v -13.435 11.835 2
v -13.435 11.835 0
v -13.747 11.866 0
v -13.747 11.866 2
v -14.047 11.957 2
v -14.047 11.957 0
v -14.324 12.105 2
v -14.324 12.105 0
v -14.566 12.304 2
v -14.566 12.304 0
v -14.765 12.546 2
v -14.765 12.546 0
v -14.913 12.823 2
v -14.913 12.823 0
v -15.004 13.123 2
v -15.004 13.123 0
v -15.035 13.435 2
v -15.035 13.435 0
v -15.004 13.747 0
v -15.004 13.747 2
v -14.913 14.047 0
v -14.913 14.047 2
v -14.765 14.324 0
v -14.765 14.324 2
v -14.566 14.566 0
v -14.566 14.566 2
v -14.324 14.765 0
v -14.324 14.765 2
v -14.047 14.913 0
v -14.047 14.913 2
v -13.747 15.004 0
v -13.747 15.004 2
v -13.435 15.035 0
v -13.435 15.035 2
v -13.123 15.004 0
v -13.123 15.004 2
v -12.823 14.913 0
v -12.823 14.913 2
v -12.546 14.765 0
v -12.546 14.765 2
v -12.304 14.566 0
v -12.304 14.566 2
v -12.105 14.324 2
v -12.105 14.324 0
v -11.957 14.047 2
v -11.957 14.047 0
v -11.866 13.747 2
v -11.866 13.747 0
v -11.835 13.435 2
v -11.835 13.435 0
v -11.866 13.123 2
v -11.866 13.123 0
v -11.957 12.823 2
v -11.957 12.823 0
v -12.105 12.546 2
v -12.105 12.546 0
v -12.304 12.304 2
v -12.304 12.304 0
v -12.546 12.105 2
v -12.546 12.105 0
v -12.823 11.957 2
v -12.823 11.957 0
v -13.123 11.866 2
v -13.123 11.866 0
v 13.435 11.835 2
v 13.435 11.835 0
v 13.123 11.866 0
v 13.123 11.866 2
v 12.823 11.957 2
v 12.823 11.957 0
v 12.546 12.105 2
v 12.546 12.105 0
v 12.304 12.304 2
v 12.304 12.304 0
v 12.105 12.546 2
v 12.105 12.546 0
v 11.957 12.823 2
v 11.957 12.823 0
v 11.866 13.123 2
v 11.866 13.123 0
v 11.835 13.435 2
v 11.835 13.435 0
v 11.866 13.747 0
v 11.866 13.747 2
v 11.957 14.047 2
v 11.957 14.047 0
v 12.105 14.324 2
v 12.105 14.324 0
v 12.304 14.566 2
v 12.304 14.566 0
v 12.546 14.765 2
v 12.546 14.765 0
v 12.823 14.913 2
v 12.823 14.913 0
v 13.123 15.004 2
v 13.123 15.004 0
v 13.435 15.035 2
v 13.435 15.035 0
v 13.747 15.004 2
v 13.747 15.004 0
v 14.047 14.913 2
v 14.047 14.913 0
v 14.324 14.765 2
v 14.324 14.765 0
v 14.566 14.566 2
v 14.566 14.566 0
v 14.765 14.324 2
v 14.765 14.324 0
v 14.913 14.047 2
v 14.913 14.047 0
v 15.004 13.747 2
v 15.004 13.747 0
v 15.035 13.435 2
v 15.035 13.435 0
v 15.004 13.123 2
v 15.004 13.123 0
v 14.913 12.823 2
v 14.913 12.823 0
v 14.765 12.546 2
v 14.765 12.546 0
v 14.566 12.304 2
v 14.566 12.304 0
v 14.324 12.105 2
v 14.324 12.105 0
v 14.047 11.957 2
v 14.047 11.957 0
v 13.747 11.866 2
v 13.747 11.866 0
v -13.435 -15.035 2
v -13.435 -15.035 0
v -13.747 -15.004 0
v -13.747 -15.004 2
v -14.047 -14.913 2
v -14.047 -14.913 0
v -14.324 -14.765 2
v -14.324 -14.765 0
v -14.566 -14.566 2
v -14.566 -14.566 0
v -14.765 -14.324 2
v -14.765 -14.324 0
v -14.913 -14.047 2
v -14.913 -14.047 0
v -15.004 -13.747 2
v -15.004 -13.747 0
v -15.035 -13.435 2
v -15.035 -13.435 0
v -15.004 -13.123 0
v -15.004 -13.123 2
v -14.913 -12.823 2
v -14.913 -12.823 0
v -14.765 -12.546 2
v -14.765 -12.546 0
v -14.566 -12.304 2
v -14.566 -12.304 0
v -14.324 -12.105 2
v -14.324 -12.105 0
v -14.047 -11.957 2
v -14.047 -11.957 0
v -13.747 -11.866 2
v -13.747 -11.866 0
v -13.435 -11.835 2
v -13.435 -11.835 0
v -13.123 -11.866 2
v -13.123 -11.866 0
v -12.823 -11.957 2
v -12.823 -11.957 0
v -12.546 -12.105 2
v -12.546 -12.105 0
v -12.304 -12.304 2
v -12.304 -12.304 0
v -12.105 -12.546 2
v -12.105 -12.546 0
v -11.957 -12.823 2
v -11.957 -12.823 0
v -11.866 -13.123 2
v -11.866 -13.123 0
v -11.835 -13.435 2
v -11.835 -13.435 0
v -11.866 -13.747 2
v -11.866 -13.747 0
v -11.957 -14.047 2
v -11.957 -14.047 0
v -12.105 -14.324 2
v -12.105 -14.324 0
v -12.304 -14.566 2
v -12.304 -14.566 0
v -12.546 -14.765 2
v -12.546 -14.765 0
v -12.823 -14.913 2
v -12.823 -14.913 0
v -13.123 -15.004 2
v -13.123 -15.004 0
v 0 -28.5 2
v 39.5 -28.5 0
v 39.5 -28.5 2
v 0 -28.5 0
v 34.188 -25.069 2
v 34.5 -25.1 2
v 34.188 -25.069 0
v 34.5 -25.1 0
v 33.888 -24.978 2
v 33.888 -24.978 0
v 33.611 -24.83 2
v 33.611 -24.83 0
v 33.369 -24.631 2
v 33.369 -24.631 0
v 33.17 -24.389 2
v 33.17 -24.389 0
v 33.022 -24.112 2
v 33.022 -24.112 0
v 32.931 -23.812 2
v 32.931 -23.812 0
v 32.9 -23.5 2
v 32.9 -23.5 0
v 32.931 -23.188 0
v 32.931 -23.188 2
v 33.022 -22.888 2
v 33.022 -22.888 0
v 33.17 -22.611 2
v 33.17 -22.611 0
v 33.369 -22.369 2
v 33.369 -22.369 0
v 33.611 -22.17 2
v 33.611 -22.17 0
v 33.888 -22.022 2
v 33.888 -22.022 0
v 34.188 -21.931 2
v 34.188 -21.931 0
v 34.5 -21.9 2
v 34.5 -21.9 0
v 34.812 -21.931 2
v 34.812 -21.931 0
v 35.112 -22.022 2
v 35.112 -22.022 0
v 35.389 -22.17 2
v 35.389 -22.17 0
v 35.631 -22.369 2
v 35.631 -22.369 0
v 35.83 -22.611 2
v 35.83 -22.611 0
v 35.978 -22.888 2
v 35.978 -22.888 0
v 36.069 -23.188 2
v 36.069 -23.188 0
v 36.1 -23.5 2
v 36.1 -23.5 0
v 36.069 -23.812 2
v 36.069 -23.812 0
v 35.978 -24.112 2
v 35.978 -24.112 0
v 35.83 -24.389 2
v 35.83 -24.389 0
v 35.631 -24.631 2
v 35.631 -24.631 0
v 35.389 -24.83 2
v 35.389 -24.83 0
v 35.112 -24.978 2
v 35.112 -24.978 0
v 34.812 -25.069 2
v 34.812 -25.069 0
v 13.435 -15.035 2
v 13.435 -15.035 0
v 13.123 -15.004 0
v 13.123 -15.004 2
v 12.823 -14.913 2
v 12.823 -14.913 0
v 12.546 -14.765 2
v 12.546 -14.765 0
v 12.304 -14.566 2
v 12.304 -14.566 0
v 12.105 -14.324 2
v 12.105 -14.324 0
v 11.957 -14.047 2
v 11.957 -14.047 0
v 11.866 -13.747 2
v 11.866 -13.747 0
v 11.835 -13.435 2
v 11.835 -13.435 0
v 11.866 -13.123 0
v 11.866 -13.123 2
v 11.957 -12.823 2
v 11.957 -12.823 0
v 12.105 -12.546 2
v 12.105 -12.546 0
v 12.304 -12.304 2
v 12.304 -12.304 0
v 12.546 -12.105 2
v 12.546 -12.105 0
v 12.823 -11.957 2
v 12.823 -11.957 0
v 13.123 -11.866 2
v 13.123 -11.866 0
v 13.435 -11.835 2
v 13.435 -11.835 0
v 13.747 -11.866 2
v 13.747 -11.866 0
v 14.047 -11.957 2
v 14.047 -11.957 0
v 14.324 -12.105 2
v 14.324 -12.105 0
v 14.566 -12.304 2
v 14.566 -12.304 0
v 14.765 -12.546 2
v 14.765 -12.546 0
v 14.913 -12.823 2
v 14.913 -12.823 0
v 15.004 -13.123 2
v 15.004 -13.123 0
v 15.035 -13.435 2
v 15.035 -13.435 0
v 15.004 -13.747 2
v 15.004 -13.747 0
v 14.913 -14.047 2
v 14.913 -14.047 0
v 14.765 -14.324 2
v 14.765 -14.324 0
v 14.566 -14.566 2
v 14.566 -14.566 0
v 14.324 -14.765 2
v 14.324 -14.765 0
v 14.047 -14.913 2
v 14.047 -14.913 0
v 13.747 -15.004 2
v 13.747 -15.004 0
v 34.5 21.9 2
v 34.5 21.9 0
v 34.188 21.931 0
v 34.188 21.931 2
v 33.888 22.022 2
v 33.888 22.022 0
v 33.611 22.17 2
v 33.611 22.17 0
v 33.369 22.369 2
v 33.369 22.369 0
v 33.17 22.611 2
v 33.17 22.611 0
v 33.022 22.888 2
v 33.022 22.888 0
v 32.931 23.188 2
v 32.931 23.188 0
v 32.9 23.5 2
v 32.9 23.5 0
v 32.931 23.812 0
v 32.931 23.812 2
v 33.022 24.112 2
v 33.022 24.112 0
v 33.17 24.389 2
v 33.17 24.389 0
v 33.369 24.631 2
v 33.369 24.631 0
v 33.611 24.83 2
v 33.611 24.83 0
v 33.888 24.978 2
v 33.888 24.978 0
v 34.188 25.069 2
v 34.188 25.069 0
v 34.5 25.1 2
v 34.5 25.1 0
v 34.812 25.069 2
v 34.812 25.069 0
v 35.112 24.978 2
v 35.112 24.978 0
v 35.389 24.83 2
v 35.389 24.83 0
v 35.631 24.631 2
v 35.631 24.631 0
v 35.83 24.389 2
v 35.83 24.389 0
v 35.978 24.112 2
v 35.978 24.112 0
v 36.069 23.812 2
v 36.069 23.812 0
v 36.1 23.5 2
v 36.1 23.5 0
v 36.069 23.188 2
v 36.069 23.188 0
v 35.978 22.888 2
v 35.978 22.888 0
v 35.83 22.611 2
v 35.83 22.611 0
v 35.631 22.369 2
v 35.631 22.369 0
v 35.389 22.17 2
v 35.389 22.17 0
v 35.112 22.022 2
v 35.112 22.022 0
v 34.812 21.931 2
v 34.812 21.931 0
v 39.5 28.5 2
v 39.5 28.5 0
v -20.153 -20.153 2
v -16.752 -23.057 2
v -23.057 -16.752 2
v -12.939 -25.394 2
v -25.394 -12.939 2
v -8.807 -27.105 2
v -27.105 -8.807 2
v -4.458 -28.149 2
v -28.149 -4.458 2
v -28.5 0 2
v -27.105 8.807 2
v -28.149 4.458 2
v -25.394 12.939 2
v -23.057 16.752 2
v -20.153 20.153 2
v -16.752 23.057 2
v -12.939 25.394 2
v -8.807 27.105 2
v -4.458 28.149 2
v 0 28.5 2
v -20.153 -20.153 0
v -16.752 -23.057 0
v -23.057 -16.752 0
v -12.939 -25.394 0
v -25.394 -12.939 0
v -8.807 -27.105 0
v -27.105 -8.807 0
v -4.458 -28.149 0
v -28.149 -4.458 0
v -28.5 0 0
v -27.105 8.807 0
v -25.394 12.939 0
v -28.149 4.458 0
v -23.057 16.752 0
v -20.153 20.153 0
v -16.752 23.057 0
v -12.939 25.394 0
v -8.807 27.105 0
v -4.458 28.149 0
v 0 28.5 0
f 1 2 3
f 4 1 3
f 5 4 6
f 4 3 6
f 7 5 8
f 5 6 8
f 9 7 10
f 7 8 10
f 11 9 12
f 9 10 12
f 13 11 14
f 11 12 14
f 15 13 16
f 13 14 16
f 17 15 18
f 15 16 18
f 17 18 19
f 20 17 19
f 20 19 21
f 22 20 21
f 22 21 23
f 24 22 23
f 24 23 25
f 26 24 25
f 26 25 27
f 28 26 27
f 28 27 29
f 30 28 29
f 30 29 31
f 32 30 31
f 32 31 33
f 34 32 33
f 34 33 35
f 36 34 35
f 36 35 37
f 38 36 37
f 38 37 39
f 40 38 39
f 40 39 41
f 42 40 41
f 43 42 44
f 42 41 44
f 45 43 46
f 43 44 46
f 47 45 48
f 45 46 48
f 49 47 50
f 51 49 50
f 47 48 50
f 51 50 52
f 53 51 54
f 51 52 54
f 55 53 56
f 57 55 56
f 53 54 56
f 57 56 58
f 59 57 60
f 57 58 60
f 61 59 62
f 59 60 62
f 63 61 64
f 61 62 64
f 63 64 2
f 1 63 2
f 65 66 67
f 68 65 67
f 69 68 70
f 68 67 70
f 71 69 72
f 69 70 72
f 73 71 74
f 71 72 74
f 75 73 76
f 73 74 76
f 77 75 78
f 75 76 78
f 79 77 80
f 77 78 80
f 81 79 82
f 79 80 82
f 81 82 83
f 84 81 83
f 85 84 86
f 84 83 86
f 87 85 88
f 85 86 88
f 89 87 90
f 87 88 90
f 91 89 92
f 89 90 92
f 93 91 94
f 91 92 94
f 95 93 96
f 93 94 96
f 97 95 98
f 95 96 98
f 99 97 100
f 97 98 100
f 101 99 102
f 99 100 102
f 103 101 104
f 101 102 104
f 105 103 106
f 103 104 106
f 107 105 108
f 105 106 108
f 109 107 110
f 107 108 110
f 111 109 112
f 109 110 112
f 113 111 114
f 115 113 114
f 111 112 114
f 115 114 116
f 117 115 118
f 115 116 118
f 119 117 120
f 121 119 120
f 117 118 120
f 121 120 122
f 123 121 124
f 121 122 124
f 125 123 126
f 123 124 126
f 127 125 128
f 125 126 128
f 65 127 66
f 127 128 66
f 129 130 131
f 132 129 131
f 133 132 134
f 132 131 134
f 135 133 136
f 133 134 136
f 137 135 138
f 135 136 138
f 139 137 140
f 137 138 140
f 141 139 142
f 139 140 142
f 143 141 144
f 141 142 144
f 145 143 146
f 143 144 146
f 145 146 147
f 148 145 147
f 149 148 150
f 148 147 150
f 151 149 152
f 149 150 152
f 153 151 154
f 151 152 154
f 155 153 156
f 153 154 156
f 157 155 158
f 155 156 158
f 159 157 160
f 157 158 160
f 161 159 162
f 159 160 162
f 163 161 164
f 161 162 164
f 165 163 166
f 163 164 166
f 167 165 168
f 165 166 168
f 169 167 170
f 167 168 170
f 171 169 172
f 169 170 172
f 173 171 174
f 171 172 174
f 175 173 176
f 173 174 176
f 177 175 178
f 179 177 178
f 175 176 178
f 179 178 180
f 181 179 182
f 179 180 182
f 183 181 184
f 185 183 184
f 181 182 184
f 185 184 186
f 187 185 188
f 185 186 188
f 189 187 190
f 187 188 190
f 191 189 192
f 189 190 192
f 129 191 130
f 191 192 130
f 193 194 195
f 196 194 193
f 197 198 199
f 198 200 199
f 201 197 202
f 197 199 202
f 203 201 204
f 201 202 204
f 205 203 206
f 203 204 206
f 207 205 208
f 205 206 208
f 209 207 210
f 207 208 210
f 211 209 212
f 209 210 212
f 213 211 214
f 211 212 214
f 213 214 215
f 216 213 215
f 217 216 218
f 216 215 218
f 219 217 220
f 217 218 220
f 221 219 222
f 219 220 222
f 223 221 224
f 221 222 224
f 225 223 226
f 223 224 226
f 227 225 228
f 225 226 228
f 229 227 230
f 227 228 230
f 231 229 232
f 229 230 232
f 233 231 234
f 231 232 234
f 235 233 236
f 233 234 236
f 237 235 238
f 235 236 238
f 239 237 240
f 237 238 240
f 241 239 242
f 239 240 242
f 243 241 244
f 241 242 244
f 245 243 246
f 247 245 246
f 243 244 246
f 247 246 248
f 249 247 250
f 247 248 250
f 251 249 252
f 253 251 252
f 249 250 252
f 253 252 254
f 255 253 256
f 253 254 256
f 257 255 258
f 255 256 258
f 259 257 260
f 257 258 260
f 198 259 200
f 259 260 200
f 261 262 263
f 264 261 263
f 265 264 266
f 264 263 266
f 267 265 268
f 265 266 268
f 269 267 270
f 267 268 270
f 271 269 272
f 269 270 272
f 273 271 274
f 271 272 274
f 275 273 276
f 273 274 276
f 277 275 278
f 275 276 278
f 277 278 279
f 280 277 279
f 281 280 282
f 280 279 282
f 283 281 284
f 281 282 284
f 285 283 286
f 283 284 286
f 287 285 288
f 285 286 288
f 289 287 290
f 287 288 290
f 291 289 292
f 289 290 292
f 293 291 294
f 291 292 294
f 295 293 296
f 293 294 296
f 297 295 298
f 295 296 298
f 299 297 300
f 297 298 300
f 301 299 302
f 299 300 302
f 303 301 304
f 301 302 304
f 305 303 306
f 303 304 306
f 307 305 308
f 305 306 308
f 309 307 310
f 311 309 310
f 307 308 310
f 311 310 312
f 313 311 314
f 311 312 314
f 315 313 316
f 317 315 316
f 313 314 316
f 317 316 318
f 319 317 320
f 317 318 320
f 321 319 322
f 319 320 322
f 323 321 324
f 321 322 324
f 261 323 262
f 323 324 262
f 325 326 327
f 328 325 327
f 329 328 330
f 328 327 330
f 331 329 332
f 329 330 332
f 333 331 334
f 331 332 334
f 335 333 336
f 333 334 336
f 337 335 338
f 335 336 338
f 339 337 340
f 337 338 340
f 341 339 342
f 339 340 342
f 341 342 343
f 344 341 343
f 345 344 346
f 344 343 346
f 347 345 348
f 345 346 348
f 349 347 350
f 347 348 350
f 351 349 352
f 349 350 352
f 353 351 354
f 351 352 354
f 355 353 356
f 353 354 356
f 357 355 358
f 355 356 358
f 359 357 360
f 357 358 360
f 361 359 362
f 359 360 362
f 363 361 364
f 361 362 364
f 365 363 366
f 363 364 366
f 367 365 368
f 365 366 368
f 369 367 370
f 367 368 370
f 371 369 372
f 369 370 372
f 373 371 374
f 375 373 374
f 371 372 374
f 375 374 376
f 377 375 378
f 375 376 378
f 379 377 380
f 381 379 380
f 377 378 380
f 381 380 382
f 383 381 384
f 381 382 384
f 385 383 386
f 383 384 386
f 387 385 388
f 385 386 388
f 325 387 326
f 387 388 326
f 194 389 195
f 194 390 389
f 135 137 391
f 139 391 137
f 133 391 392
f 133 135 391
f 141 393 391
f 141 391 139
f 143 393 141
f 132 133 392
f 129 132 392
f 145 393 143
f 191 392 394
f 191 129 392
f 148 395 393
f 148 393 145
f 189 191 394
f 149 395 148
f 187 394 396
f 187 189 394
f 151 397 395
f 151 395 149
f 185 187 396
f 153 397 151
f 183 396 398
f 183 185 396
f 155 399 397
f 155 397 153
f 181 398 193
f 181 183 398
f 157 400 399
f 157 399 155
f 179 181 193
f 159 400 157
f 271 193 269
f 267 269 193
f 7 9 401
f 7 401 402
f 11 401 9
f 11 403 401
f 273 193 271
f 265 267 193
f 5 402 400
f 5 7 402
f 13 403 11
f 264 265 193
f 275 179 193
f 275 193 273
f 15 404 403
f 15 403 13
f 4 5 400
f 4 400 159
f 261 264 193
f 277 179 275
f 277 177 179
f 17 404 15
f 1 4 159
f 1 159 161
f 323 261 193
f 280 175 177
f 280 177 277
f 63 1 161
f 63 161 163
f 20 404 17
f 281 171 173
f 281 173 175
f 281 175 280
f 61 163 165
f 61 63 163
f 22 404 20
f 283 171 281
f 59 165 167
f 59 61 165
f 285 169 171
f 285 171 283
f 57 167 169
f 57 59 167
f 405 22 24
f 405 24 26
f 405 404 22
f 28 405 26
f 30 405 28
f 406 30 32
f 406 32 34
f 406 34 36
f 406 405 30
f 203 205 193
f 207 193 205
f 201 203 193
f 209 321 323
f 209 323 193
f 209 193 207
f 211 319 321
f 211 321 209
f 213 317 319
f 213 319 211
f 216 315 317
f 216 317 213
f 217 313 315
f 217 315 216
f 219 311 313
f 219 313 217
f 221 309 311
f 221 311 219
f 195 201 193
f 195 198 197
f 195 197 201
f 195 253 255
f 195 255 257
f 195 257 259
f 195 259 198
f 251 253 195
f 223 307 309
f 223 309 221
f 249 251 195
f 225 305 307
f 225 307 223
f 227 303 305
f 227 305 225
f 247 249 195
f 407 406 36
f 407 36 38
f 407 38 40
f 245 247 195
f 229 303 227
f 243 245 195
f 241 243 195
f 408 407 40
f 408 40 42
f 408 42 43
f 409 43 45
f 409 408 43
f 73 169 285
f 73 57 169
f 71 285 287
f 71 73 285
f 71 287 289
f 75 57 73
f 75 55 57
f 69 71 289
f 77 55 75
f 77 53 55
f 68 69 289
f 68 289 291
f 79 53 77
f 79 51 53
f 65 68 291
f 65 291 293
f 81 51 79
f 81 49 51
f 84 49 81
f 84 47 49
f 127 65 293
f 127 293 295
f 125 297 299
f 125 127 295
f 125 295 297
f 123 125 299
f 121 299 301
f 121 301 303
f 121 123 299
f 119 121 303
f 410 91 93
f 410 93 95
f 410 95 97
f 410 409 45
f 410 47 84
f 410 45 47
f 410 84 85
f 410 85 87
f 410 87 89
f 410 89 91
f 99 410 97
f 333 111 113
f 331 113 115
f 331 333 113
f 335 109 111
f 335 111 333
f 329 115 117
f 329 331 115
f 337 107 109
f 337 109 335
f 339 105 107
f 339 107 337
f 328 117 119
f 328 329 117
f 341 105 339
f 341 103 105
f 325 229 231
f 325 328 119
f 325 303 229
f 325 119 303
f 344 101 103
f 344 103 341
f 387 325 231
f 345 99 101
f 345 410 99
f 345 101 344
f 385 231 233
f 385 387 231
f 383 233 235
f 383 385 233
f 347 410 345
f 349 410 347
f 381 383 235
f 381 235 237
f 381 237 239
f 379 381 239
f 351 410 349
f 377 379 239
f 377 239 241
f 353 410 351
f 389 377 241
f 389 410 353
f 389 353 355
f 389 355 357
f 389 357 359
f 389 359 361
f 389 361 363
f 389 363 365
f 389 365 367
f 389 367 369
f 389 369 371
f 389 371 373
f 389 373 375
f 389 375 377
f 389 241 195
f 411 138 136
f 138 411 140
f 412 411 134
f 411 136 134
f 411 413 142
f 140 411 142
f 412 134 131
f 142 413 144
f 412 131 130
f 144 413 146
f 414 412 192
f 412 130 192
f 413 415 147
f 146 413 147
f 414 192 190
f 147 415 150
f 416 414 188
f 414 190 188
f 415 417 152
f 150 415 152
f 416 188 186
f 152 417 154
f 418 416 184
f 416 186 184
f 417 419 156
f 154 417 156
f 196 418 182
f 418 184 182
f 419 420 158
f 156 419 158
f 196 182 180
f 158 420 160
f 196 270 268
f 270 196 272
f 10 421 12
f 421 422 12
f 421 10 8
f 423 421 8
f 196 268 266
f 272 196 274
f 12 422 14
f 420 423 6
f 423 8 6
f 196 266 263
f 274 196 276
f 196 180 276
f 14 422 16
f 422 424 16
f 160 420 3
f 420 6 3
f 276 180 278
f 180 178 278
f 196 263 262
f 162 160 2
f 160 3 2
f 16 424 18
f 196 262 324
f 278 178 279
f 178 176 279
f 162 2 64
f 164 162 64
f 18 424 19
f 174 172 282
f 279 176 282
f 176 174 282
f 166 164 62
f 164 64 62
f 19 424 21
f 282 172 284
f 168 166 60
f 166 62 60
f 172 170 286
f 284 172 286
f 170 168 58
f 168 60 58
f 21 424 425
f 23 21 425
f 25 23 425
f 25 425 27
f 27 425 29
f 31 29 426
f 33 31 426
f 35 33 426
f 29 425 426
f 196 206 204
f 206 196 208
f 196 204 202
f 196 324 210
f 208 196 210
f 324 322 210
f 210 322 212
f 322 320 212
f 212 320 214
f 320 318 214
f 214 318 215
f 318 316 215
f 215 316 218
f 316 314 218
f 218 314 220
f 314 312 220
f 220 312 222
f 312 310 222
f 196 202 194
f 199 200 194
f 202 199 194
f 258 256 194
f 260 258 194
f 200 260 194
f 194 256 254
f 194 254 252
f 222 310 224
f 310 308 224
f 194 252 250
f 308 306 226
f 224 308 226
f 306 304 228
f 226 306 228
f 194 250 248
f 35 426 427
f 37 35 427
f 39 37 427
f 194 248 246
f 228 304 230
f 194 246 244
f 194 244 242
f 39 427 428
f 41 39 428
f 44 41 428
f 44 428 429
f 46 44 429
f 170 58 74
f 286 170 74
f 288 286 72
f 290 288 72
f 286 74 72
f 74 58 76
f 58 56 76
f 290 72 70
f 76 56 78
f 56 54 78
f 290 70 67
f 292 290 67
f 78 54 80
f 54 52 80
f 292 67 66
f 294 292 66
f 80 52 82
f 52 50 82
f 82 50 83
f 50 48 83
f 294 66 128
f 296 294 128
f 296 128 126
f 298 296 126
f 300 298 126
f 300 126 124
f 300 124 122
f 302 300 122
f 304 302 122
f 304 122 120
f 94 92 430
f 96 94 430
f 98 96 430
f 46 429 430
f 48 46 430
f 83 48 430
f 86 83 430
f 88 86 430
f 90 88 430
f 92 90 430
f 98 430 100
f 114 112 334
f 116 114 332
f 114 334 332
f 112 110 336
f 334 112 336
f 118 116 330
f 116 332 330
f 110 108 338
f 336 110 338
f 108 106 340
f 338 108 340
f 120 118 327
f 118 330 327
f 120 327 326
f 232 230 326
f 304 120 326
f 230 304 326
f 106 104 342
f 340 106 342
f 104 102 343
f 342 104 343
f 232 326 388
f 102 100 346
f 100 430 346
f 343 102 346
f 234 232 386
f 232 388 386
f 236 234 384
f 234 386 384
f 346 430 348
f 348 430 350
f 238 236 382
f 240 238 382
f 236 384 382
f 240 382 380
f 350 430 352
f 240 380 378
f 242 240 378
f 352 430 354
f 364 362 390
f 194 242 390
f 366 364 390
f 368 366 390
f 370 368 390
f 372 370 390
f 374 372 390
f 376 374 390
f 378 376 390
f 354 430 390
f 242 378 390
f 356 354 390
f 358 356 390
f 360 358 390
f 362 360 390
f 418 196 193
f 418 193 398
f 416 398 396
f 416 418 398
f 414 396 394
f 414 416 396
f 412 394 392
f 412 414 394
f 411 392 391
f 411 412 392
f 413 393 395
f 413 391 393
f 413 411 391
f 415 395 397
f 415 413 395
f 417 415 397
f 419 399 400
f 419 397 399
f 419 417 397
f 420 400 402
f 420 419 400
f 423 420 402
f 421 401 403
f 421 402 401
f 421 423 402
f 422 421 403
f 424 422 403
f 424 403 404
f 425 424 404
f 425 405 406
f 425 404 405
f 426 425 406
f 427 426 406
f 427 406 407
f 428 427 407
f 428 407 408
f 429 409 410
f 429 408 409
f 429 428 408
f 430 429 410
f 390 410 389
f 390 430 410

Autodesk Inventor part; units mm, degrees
ref_plane "YZ Plane" through (0, 0, 0) normal (1, 0, 0) x (0, 1, 0)
ref_plane "XZ Plane" through (0, 0, 0) normal (0, 1, 0) x (-1, 0, 0)
ref_plane "XY Plane" through (0, 0, 0) normal (0, 0, 1) x (1, 0, 0)
sketch "スケッチ1" plane through (0, 0, 0) normal (0, 0, 1) x (1, 0, 0)
  circle A0 centre (0, 0) radius 28.5
  line L0 (0, 28.5) -> (39.5, 28.5)
  line L1 (39.5, 28.5) -> (39.5, -28.5)
  line L2 (39.5, -28.5) -> (0, -28.5)
  line L3 (0, -28.5) -> (0, 28.5)
  point P0 (28.5, 0)
  dimension "d0" = 57
  dimension "d19" = 39.5
extrude "押し出し1" add sketch "スケッチ1" along normal blind 2
sketch "スケッチ3" plane through (0, 0, 2) normal (0, 0, 1) x (1, 0, 0)
  circle A0 centre (0, 0) radius 19
  line L0 (0, 0) -> (13.435, -13.435)
  line L1 (0, 0) -> (19, 0) construction
  line L2 (39.5, 28.5) -> (0, 28.5) projected
  line L3 (34.5, 28.5) -> (34.5, -28.5)
  line L4 (0, -28.5) -> (39.5, -28.5) projected
  line L5 (39.5, -28.5) -> (39.5, 28.5) projected
  point P0 (13.435, 13.435)
  point P1 (-13.435, 13.435)
  point P2 (-13.435, -13.435)
  point P3 (34.5, 23.5)
  point P4 (34.5, -23.5)
  dimension "d22" = 38
  dimension "d23" = 45
  dimension "d26" = 360
  dimension "d28" = 5
  dimension "d29" = 5
  dimension "d37" = 5
hole "穴2" at (13.435, -13.435, 2) at (13.435, 13.435, 2) at (-13.435, 13.435, 2) at (-13.435, -13.435, 2) at (34.5, 23.5, 2) at (34.5, -23.5, 2) direction (0, 0, -1) diameter 3.2 end through all
properties part number "link4_plate2" material "アルミニウム 6061"
